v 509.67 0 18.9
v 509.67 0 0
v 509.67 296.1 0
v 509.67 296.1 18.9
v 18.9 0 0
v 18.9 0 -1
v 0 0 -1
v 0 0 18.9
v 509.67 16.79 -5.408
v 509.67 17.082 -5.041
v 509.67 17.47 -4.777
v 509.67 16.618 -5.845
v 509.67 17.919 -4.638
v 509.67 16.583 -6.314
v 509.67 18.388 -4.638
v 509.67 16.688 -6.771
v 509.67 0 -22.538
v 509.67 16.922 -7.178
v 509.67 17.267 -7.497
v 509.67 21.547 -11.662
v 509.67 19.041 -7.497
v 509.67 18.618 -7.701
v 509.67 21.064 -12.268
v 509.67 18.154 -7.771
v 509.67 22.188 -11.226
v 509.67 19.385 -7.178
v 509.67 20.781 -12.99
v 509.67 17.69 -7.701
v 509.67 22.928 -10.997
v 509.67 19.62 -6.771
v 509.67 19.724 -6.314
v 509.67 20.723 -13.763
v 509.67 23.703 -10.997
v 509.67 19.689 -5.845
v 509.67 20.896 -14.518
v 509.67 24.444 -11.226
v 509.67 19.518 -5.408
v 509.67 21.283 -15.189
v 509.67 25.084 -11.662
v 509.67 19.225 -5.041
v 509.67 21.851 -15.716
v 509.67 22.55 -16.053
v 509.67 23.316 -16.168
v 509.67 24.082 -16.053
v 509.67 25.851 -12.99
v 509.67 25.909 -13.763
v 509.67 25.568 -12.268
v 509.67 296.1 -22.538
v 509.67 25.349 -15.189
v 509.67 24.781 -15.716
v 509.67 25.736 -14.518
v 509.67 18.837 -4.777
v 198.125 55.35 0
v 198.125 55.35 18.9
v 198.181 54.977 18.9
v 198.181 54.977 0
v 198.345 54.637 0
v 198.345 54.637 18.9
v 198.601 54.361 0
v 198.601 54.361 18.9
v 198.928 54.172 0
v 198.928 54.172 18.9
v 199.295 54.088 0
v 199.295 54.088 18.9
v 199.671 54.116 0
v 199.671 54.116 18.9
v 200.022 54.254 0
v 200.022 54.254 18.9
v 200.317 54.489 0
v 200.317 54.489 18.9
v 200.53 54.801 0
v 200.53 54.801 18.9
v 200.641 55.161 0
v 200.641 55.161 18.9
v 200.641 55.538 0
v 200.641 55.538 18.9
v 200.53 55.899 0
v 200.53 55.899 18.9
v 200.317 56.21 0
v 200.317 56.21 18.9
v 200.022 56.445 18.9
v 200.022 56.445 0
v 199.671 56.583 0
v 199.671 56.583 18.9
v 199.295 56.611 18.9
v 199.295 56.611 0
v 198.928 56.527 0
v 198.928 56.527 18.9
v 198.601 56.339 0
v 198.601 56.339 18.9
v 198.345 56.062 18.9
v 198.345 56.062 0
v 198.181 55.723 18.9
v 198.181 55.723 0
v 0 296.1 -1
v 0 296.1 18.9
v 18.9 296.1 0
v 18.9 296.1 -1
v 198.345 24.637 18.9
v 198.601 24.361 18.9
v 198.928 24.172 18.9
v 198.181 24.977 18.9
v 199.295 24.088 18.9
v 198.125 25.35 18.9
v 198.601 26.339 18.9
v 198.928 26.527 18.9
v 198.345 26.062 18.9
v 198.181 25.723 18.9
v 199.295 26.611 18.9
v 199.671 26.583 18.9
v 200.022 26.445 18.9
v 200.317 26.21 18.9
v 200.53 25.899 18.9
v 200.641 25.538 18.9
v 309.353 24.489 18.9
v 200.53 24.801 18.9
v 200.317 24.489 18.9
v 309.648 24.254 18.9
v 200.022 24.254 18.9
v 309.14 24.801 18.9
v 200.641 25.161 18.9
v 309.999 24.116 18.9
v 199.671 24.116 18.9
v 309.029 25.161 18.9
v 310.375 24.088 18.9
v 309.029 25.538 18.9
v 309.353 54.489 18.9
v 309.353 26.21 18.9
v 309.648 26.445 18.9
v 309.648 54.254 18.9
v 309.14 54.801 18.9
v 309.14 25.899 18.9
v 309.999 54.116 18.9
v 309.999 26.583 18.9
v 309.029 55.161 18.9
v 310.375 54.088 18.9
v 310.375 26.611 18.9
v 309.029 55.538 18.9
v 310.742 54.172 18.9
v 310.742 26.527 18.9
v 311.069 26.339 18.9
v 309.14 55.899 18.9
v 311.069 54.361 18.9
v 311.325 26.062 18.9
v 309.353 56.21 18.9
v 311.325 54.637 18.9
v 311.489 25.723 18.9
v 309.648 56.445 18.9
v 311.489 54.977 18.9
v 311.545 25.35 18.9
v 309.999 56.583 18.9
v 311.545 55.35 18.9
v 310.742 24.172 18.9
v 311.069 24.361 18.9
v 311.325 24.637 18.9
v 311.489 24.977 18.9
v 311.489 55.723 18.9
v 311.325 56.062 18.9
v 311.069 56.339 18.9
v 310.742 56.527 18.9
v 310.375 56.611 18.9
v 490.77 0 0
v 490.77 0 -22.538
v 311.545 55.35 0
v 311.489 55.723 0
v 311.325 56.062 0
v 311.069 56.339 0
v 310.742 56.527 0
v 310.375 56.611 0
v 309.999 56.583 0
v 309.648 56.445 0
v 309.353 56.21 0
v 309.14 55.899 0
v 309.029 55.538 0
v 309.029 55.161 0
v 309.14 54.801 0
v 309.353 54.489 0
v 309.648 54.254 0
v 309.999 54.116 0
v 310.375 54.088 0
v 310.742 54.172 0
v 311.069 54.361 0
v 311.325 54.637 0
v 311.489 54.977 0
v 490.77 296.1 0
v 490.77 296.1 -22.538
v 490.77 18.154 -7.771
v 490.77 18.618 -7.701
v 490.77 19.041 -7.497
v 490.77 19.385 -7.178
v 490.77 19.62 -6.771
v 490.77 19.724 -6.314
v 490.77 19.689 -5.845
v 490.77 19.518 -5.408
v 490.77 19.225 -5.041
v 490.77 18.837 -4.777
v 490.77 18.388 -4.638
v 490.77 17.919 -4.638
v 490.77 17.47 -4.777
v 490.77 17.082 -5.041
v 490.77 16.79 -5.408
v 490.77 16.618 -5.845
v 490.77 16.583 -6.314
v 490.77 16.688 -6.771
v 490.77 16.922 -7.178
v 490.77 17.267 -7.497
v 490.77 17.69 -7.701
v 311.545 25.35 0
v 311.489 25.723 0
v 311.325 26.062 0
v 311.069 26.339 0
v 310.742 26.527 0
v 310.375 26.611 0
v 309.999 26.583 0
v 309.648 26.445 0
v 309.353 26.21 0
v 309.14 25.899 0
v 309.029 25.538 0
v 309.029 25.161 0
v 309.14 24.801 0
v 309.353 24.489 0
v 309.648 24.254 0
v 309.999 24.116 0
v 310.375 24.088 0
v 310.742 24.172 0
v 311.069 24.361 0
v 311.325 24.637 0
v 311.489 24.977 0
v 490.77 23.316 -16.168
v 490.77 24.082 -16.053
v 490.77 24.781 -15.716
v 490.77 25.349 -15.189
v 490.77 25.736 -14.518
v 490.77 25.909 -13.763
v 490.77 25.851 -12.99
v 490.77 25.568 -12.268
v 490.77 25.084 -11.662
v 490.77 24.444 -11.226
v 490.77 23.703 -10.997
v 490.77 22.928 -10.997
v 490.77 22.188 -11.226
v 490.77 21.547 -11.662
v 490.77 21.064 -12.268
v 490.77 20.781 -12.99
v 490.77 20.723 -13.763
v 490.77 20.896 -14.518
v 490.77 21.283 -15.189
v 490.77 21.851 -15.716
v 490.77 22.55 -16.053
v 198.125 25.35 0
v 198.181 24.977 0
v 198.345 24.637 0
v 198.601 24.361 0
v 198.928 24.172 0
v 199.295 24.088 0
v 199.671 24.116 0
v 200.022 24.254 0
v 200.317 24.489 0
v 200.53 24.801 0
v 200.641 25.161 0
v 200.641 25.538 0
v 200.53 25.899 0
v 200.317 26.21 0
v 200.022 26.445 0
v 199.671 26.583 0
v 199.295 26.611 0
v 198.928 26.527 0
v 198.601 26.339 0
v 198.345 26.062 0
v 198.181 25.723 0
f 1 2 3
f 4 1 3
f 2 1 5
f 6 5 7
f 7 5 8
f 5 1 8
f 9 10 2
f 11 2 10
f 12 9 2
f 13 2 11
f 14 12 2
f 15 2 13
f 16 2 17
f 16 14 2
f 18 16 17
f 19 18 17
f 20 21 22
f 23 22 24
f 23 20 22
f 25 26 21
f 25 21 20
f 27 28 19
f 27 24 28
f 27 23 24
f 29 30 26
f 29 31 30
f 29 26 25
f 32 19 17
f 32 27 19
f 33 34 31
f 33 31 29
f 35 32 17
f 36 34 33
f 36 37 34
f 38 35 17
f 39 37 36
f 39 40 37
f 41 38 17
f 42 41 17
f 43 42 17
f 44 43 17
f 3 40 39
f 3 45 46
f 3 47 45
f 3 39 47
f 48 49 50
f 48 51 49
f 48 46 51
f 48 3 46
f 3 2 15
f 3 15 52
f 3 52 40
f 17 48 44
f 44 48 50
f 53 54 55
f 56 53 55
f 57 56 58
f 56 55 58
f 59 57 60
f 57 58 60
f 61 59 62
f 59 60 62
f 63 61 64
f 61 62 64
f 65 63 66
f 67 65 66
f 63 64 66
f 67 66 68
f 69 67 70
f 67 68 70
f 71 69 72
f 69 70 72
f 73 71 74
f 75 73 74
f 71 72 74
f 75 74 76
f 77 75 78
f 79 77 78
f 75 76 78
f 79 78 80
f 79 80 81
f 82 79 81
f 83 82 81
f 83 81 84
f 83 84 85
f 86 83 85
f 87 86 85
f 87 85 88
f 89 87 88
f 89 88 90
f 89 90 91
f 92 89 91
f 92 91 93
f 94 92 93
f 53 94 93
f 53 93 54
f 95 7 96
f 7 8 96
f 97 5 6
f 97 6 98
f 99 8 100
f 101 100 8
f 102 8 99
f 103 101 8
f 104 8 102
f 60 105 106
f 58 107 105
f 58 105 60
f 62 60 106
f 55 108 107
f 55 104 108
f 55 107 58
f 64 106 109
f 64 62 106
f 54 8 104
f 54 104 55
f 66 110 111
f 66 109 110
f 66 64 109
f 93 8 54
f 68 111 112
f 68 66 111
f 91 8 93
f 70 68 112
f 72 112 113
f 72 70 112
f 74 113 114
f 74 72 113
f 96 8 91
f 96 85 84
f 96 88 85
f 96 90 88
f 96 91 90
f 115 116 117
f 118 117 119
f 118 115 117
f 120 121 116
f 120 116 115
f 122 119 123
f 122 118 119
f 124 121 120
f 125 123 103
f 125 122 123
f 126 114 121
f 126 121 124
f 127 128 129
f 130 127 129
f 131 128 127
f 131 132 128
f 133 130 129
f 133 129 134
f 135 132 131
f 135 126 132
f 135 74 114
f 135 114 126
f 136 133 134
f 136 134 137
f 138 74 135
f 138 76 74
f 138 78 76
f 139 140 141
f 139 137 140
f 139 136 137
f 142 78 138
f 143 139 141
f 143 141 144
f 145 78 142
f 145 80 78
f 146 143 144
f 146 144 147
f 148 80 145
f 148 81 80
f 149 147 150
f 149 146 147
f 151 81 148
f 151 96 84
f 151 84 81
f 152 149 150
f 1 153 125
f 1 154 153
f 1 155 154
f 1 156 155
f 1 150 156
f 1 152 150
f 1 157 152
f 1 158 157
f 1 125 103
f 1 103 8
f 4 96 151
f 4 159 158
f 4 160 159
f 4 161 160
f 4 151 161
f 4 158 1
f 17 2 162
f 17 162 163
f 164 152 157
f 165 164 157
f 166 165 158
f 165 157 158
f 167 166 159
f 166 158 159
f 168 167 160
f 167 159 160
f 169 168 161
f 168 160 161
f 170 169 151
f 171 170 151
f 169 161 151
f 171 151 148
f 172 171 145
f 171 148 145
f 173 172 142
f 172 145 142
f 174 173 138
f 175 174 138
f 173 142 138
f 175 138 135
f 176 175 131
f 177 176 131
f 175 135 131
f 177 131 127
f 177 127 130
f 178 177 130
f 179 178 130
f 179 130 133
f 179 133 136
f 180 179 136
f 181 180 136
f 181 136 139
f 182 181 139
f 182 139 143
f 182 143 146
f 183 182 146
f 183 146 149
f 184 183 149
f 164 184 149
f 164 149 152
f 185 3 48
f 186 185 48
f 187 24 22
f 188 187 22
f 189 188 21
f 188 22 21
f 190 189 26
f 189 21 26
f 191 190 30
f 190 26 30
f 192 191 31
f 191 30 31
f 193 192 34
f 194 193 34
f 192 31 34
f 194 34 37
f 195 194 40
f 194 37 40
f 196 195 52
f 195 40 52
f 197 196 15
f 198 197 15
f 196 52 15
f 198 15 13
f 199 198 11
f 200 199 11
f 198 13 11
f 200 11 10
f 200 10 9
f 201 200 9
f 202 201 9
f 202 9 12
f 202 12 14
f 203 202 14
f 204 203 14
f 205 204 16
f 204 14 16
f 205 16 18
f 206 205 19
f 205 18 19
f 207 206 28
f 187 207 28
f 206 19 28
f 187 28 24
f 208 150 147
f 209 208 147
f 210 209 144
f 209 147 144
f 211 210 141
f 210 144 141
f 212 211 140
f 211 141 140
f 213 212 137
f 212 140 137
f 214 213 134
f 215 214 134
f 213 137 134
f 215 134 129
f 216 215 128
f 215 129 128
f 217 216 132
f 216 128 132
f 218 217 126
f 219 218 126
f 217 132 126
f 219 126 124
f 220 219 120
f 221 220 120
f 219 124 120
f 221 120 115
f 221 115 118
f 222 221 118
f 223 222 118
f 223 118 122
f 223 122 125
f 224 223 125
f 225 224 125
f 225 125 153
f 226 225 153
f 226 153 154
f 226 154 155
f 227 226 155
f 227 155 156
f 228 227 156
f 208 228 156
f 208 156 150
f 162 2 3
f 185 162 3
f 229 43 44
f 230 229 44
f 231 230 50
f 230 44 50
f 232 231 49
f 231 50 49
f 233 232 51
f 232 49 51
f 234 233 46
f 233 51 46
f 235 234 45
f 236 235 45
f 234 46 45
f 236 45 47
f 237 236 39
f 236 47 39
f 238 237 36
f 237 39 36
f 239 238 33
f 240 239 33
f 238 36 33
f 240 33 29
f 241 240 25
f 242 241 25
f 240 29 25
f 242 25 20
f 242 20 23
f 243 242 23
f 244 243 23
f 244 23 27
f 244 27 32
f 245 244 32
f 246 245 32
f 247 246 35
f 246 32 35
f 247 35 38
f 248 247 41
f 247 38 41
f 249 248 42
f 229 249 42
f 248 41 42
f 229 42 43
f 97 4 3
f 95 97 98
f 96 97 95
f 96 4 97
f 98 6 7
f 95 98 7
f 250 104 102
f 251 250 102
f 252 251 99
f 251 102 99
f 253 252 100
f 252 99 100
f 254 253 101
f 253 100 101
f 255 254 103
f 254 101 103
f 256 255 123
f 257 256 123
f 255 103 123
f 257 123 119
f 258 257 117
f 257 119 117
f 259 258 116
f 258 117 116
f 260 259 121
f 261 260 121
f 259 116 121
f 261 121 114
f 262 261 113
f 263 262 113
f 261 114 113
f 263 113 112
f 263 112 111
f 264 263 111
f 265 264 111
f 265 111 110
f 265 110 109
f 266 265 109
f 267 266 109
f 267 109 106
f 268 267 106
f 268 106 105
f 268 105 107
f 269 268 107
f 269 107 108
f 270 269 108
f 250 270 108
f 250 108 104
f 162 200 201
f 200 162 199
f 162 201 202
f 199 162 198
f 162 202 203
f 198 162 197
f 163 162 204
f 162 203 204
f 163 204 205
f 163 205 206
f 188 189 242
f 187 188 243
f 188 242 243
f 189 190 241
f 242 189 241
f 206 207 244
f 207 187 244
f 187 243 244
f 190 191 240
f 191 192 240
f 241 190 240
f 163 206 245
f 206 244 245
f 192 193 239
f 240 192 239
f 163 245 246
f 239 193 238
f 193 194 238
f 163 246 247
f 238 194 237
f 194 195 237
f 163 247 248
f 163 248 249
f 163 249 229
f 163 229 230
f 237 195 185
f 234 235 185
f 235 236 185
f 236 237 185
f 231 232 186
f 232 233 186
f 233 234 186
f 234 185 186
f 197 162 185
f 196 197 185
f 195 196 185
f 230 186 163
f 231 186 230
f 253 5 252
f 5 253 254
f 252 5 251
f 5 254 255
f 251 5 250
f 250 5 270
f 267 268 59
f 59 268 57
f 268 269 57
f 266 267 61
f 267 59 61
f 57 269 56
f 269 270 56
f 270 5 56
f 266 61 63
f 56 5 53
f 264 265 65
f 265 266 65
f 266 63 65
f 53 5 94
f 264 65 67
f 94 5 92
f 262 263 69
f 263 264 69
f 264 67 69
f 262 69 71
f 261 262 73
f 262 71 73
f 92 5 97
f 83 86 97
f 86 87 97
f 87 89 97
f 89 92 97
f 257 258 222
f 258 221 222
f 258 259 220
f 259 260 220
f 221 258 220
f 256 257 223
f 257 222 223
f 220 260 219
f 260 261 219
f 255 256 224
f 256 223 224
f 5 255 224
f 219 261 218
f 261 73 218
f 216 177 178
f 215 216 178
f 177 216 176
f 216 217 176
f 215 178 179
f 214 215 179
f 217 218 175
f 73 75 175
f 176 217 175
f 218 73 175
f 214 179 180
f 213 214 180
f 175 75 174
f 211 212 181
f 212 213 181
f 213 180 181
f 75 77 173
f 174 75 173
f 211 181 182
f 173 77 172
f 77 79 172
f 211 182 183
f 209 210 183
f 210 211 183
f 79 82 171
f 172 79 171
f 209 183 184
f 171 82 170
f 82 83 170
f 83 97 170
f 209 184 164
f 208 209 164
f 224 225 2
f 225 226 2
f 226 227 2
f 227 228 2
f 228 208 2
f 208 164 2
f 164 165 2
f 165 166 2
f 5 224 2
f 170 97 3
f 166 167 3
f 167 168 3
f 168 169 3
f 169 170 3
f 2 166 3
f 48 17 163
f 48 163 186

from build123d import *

# Parameters (mm, degrees)
CROQUIS1_W              = 509.67
CROQUIS1_H              = 296.1
SALIENTE_EXTRUIR1_DEPTH = 18.9
CROQUIS3_W              = 22.537538862
CROQUIS3_H              = 296.1
CROQUIS3_R              = 1.575
CROQUIS3_R_2            = 2.6
SALIENTE_EXTRUIR2_DEPTH = 18.9
CROQUIS9_W              = 18.9
CROQUIS9_H              = 296.1
SALIENTE_EXTRUIR6_DEPTH = 1
CROQUIS11_R             = 1.265
CORTAR_EXTRUIR2_DEPTH   = 591.894058632


with BuildPart() as part:
    # Croquis1 → Saliente-Extruir1 (new body)
    with BuildSketch(Plane.XY):
        with Locations((254.835, 148.05)):
            Rectangle(CROQUIS1_W, CROQUIS1_H)
    extrude(amount=SALIENTE_EXTRUIR1_DEPTH)

    # Croquis9 → Saliente-Extruir6 (add)
    with BuildSketch(Plane(origin=(0, 0, 0), x_dir=(-1, 0, 0), z_dir=(0, 0, -1))):
        with Locations((-9.45, 148.05)):
            Rectangle(CROQUIS9_W, CROQUIS9_H)
    extrude(amount=SALIENTE_EXTRUIR6_DEPTH)

    # Croquis11 → Cortar-Extruir2 (cut, through all)
    with BuildSketch(Plane.XY.offset(18.9)):
        with Locations((310.28, 55.349717972)):
            Circle(CROQUIS11_R)
        with Locations((310.28, 25.349717972)):
            Circle(CROQUIS11_R)
        with Locations(Location((199.39, 25.349717972, 0), (0, 0, 180))):
            Circle(CROQUIS11_R)
        with Locations(Location((199.39, 55.349717972, 0), (0, 0, 180))):
            Circle(CROQUIS11_R)
    extrude(amount=-CORTAR_EXTRUIR2_DEPTH, mode=Mode.SUBTRACT)


with BuildPart() as body_2:
    # Croquis3 → Saliente-Extruir2 (new body)
    with BuildSketch(Plane(origin=(509.67, 0, 0), x_dir=(0, 0, -1), z_dir=(1, 0, 0))):
        with Locations((11.268769431, 148.05)):
            Rectangle(CROQUIS3_W, CROQUIS3_H)
        with Locations((6.195860675, 18.153754462)):
            Circle(CROQUIS3_R, mode=Mode.SUBTRACT)
        with Locations((13.568229074, 23.31594239)):
            Circle(CROQUIS3_R_2, mode=Mode.SUBTRACT)
    extrude(amount=-SALIENTE_EXTRUIR2_DEPTH)


solid = Compound([part.part, body_2.part])
